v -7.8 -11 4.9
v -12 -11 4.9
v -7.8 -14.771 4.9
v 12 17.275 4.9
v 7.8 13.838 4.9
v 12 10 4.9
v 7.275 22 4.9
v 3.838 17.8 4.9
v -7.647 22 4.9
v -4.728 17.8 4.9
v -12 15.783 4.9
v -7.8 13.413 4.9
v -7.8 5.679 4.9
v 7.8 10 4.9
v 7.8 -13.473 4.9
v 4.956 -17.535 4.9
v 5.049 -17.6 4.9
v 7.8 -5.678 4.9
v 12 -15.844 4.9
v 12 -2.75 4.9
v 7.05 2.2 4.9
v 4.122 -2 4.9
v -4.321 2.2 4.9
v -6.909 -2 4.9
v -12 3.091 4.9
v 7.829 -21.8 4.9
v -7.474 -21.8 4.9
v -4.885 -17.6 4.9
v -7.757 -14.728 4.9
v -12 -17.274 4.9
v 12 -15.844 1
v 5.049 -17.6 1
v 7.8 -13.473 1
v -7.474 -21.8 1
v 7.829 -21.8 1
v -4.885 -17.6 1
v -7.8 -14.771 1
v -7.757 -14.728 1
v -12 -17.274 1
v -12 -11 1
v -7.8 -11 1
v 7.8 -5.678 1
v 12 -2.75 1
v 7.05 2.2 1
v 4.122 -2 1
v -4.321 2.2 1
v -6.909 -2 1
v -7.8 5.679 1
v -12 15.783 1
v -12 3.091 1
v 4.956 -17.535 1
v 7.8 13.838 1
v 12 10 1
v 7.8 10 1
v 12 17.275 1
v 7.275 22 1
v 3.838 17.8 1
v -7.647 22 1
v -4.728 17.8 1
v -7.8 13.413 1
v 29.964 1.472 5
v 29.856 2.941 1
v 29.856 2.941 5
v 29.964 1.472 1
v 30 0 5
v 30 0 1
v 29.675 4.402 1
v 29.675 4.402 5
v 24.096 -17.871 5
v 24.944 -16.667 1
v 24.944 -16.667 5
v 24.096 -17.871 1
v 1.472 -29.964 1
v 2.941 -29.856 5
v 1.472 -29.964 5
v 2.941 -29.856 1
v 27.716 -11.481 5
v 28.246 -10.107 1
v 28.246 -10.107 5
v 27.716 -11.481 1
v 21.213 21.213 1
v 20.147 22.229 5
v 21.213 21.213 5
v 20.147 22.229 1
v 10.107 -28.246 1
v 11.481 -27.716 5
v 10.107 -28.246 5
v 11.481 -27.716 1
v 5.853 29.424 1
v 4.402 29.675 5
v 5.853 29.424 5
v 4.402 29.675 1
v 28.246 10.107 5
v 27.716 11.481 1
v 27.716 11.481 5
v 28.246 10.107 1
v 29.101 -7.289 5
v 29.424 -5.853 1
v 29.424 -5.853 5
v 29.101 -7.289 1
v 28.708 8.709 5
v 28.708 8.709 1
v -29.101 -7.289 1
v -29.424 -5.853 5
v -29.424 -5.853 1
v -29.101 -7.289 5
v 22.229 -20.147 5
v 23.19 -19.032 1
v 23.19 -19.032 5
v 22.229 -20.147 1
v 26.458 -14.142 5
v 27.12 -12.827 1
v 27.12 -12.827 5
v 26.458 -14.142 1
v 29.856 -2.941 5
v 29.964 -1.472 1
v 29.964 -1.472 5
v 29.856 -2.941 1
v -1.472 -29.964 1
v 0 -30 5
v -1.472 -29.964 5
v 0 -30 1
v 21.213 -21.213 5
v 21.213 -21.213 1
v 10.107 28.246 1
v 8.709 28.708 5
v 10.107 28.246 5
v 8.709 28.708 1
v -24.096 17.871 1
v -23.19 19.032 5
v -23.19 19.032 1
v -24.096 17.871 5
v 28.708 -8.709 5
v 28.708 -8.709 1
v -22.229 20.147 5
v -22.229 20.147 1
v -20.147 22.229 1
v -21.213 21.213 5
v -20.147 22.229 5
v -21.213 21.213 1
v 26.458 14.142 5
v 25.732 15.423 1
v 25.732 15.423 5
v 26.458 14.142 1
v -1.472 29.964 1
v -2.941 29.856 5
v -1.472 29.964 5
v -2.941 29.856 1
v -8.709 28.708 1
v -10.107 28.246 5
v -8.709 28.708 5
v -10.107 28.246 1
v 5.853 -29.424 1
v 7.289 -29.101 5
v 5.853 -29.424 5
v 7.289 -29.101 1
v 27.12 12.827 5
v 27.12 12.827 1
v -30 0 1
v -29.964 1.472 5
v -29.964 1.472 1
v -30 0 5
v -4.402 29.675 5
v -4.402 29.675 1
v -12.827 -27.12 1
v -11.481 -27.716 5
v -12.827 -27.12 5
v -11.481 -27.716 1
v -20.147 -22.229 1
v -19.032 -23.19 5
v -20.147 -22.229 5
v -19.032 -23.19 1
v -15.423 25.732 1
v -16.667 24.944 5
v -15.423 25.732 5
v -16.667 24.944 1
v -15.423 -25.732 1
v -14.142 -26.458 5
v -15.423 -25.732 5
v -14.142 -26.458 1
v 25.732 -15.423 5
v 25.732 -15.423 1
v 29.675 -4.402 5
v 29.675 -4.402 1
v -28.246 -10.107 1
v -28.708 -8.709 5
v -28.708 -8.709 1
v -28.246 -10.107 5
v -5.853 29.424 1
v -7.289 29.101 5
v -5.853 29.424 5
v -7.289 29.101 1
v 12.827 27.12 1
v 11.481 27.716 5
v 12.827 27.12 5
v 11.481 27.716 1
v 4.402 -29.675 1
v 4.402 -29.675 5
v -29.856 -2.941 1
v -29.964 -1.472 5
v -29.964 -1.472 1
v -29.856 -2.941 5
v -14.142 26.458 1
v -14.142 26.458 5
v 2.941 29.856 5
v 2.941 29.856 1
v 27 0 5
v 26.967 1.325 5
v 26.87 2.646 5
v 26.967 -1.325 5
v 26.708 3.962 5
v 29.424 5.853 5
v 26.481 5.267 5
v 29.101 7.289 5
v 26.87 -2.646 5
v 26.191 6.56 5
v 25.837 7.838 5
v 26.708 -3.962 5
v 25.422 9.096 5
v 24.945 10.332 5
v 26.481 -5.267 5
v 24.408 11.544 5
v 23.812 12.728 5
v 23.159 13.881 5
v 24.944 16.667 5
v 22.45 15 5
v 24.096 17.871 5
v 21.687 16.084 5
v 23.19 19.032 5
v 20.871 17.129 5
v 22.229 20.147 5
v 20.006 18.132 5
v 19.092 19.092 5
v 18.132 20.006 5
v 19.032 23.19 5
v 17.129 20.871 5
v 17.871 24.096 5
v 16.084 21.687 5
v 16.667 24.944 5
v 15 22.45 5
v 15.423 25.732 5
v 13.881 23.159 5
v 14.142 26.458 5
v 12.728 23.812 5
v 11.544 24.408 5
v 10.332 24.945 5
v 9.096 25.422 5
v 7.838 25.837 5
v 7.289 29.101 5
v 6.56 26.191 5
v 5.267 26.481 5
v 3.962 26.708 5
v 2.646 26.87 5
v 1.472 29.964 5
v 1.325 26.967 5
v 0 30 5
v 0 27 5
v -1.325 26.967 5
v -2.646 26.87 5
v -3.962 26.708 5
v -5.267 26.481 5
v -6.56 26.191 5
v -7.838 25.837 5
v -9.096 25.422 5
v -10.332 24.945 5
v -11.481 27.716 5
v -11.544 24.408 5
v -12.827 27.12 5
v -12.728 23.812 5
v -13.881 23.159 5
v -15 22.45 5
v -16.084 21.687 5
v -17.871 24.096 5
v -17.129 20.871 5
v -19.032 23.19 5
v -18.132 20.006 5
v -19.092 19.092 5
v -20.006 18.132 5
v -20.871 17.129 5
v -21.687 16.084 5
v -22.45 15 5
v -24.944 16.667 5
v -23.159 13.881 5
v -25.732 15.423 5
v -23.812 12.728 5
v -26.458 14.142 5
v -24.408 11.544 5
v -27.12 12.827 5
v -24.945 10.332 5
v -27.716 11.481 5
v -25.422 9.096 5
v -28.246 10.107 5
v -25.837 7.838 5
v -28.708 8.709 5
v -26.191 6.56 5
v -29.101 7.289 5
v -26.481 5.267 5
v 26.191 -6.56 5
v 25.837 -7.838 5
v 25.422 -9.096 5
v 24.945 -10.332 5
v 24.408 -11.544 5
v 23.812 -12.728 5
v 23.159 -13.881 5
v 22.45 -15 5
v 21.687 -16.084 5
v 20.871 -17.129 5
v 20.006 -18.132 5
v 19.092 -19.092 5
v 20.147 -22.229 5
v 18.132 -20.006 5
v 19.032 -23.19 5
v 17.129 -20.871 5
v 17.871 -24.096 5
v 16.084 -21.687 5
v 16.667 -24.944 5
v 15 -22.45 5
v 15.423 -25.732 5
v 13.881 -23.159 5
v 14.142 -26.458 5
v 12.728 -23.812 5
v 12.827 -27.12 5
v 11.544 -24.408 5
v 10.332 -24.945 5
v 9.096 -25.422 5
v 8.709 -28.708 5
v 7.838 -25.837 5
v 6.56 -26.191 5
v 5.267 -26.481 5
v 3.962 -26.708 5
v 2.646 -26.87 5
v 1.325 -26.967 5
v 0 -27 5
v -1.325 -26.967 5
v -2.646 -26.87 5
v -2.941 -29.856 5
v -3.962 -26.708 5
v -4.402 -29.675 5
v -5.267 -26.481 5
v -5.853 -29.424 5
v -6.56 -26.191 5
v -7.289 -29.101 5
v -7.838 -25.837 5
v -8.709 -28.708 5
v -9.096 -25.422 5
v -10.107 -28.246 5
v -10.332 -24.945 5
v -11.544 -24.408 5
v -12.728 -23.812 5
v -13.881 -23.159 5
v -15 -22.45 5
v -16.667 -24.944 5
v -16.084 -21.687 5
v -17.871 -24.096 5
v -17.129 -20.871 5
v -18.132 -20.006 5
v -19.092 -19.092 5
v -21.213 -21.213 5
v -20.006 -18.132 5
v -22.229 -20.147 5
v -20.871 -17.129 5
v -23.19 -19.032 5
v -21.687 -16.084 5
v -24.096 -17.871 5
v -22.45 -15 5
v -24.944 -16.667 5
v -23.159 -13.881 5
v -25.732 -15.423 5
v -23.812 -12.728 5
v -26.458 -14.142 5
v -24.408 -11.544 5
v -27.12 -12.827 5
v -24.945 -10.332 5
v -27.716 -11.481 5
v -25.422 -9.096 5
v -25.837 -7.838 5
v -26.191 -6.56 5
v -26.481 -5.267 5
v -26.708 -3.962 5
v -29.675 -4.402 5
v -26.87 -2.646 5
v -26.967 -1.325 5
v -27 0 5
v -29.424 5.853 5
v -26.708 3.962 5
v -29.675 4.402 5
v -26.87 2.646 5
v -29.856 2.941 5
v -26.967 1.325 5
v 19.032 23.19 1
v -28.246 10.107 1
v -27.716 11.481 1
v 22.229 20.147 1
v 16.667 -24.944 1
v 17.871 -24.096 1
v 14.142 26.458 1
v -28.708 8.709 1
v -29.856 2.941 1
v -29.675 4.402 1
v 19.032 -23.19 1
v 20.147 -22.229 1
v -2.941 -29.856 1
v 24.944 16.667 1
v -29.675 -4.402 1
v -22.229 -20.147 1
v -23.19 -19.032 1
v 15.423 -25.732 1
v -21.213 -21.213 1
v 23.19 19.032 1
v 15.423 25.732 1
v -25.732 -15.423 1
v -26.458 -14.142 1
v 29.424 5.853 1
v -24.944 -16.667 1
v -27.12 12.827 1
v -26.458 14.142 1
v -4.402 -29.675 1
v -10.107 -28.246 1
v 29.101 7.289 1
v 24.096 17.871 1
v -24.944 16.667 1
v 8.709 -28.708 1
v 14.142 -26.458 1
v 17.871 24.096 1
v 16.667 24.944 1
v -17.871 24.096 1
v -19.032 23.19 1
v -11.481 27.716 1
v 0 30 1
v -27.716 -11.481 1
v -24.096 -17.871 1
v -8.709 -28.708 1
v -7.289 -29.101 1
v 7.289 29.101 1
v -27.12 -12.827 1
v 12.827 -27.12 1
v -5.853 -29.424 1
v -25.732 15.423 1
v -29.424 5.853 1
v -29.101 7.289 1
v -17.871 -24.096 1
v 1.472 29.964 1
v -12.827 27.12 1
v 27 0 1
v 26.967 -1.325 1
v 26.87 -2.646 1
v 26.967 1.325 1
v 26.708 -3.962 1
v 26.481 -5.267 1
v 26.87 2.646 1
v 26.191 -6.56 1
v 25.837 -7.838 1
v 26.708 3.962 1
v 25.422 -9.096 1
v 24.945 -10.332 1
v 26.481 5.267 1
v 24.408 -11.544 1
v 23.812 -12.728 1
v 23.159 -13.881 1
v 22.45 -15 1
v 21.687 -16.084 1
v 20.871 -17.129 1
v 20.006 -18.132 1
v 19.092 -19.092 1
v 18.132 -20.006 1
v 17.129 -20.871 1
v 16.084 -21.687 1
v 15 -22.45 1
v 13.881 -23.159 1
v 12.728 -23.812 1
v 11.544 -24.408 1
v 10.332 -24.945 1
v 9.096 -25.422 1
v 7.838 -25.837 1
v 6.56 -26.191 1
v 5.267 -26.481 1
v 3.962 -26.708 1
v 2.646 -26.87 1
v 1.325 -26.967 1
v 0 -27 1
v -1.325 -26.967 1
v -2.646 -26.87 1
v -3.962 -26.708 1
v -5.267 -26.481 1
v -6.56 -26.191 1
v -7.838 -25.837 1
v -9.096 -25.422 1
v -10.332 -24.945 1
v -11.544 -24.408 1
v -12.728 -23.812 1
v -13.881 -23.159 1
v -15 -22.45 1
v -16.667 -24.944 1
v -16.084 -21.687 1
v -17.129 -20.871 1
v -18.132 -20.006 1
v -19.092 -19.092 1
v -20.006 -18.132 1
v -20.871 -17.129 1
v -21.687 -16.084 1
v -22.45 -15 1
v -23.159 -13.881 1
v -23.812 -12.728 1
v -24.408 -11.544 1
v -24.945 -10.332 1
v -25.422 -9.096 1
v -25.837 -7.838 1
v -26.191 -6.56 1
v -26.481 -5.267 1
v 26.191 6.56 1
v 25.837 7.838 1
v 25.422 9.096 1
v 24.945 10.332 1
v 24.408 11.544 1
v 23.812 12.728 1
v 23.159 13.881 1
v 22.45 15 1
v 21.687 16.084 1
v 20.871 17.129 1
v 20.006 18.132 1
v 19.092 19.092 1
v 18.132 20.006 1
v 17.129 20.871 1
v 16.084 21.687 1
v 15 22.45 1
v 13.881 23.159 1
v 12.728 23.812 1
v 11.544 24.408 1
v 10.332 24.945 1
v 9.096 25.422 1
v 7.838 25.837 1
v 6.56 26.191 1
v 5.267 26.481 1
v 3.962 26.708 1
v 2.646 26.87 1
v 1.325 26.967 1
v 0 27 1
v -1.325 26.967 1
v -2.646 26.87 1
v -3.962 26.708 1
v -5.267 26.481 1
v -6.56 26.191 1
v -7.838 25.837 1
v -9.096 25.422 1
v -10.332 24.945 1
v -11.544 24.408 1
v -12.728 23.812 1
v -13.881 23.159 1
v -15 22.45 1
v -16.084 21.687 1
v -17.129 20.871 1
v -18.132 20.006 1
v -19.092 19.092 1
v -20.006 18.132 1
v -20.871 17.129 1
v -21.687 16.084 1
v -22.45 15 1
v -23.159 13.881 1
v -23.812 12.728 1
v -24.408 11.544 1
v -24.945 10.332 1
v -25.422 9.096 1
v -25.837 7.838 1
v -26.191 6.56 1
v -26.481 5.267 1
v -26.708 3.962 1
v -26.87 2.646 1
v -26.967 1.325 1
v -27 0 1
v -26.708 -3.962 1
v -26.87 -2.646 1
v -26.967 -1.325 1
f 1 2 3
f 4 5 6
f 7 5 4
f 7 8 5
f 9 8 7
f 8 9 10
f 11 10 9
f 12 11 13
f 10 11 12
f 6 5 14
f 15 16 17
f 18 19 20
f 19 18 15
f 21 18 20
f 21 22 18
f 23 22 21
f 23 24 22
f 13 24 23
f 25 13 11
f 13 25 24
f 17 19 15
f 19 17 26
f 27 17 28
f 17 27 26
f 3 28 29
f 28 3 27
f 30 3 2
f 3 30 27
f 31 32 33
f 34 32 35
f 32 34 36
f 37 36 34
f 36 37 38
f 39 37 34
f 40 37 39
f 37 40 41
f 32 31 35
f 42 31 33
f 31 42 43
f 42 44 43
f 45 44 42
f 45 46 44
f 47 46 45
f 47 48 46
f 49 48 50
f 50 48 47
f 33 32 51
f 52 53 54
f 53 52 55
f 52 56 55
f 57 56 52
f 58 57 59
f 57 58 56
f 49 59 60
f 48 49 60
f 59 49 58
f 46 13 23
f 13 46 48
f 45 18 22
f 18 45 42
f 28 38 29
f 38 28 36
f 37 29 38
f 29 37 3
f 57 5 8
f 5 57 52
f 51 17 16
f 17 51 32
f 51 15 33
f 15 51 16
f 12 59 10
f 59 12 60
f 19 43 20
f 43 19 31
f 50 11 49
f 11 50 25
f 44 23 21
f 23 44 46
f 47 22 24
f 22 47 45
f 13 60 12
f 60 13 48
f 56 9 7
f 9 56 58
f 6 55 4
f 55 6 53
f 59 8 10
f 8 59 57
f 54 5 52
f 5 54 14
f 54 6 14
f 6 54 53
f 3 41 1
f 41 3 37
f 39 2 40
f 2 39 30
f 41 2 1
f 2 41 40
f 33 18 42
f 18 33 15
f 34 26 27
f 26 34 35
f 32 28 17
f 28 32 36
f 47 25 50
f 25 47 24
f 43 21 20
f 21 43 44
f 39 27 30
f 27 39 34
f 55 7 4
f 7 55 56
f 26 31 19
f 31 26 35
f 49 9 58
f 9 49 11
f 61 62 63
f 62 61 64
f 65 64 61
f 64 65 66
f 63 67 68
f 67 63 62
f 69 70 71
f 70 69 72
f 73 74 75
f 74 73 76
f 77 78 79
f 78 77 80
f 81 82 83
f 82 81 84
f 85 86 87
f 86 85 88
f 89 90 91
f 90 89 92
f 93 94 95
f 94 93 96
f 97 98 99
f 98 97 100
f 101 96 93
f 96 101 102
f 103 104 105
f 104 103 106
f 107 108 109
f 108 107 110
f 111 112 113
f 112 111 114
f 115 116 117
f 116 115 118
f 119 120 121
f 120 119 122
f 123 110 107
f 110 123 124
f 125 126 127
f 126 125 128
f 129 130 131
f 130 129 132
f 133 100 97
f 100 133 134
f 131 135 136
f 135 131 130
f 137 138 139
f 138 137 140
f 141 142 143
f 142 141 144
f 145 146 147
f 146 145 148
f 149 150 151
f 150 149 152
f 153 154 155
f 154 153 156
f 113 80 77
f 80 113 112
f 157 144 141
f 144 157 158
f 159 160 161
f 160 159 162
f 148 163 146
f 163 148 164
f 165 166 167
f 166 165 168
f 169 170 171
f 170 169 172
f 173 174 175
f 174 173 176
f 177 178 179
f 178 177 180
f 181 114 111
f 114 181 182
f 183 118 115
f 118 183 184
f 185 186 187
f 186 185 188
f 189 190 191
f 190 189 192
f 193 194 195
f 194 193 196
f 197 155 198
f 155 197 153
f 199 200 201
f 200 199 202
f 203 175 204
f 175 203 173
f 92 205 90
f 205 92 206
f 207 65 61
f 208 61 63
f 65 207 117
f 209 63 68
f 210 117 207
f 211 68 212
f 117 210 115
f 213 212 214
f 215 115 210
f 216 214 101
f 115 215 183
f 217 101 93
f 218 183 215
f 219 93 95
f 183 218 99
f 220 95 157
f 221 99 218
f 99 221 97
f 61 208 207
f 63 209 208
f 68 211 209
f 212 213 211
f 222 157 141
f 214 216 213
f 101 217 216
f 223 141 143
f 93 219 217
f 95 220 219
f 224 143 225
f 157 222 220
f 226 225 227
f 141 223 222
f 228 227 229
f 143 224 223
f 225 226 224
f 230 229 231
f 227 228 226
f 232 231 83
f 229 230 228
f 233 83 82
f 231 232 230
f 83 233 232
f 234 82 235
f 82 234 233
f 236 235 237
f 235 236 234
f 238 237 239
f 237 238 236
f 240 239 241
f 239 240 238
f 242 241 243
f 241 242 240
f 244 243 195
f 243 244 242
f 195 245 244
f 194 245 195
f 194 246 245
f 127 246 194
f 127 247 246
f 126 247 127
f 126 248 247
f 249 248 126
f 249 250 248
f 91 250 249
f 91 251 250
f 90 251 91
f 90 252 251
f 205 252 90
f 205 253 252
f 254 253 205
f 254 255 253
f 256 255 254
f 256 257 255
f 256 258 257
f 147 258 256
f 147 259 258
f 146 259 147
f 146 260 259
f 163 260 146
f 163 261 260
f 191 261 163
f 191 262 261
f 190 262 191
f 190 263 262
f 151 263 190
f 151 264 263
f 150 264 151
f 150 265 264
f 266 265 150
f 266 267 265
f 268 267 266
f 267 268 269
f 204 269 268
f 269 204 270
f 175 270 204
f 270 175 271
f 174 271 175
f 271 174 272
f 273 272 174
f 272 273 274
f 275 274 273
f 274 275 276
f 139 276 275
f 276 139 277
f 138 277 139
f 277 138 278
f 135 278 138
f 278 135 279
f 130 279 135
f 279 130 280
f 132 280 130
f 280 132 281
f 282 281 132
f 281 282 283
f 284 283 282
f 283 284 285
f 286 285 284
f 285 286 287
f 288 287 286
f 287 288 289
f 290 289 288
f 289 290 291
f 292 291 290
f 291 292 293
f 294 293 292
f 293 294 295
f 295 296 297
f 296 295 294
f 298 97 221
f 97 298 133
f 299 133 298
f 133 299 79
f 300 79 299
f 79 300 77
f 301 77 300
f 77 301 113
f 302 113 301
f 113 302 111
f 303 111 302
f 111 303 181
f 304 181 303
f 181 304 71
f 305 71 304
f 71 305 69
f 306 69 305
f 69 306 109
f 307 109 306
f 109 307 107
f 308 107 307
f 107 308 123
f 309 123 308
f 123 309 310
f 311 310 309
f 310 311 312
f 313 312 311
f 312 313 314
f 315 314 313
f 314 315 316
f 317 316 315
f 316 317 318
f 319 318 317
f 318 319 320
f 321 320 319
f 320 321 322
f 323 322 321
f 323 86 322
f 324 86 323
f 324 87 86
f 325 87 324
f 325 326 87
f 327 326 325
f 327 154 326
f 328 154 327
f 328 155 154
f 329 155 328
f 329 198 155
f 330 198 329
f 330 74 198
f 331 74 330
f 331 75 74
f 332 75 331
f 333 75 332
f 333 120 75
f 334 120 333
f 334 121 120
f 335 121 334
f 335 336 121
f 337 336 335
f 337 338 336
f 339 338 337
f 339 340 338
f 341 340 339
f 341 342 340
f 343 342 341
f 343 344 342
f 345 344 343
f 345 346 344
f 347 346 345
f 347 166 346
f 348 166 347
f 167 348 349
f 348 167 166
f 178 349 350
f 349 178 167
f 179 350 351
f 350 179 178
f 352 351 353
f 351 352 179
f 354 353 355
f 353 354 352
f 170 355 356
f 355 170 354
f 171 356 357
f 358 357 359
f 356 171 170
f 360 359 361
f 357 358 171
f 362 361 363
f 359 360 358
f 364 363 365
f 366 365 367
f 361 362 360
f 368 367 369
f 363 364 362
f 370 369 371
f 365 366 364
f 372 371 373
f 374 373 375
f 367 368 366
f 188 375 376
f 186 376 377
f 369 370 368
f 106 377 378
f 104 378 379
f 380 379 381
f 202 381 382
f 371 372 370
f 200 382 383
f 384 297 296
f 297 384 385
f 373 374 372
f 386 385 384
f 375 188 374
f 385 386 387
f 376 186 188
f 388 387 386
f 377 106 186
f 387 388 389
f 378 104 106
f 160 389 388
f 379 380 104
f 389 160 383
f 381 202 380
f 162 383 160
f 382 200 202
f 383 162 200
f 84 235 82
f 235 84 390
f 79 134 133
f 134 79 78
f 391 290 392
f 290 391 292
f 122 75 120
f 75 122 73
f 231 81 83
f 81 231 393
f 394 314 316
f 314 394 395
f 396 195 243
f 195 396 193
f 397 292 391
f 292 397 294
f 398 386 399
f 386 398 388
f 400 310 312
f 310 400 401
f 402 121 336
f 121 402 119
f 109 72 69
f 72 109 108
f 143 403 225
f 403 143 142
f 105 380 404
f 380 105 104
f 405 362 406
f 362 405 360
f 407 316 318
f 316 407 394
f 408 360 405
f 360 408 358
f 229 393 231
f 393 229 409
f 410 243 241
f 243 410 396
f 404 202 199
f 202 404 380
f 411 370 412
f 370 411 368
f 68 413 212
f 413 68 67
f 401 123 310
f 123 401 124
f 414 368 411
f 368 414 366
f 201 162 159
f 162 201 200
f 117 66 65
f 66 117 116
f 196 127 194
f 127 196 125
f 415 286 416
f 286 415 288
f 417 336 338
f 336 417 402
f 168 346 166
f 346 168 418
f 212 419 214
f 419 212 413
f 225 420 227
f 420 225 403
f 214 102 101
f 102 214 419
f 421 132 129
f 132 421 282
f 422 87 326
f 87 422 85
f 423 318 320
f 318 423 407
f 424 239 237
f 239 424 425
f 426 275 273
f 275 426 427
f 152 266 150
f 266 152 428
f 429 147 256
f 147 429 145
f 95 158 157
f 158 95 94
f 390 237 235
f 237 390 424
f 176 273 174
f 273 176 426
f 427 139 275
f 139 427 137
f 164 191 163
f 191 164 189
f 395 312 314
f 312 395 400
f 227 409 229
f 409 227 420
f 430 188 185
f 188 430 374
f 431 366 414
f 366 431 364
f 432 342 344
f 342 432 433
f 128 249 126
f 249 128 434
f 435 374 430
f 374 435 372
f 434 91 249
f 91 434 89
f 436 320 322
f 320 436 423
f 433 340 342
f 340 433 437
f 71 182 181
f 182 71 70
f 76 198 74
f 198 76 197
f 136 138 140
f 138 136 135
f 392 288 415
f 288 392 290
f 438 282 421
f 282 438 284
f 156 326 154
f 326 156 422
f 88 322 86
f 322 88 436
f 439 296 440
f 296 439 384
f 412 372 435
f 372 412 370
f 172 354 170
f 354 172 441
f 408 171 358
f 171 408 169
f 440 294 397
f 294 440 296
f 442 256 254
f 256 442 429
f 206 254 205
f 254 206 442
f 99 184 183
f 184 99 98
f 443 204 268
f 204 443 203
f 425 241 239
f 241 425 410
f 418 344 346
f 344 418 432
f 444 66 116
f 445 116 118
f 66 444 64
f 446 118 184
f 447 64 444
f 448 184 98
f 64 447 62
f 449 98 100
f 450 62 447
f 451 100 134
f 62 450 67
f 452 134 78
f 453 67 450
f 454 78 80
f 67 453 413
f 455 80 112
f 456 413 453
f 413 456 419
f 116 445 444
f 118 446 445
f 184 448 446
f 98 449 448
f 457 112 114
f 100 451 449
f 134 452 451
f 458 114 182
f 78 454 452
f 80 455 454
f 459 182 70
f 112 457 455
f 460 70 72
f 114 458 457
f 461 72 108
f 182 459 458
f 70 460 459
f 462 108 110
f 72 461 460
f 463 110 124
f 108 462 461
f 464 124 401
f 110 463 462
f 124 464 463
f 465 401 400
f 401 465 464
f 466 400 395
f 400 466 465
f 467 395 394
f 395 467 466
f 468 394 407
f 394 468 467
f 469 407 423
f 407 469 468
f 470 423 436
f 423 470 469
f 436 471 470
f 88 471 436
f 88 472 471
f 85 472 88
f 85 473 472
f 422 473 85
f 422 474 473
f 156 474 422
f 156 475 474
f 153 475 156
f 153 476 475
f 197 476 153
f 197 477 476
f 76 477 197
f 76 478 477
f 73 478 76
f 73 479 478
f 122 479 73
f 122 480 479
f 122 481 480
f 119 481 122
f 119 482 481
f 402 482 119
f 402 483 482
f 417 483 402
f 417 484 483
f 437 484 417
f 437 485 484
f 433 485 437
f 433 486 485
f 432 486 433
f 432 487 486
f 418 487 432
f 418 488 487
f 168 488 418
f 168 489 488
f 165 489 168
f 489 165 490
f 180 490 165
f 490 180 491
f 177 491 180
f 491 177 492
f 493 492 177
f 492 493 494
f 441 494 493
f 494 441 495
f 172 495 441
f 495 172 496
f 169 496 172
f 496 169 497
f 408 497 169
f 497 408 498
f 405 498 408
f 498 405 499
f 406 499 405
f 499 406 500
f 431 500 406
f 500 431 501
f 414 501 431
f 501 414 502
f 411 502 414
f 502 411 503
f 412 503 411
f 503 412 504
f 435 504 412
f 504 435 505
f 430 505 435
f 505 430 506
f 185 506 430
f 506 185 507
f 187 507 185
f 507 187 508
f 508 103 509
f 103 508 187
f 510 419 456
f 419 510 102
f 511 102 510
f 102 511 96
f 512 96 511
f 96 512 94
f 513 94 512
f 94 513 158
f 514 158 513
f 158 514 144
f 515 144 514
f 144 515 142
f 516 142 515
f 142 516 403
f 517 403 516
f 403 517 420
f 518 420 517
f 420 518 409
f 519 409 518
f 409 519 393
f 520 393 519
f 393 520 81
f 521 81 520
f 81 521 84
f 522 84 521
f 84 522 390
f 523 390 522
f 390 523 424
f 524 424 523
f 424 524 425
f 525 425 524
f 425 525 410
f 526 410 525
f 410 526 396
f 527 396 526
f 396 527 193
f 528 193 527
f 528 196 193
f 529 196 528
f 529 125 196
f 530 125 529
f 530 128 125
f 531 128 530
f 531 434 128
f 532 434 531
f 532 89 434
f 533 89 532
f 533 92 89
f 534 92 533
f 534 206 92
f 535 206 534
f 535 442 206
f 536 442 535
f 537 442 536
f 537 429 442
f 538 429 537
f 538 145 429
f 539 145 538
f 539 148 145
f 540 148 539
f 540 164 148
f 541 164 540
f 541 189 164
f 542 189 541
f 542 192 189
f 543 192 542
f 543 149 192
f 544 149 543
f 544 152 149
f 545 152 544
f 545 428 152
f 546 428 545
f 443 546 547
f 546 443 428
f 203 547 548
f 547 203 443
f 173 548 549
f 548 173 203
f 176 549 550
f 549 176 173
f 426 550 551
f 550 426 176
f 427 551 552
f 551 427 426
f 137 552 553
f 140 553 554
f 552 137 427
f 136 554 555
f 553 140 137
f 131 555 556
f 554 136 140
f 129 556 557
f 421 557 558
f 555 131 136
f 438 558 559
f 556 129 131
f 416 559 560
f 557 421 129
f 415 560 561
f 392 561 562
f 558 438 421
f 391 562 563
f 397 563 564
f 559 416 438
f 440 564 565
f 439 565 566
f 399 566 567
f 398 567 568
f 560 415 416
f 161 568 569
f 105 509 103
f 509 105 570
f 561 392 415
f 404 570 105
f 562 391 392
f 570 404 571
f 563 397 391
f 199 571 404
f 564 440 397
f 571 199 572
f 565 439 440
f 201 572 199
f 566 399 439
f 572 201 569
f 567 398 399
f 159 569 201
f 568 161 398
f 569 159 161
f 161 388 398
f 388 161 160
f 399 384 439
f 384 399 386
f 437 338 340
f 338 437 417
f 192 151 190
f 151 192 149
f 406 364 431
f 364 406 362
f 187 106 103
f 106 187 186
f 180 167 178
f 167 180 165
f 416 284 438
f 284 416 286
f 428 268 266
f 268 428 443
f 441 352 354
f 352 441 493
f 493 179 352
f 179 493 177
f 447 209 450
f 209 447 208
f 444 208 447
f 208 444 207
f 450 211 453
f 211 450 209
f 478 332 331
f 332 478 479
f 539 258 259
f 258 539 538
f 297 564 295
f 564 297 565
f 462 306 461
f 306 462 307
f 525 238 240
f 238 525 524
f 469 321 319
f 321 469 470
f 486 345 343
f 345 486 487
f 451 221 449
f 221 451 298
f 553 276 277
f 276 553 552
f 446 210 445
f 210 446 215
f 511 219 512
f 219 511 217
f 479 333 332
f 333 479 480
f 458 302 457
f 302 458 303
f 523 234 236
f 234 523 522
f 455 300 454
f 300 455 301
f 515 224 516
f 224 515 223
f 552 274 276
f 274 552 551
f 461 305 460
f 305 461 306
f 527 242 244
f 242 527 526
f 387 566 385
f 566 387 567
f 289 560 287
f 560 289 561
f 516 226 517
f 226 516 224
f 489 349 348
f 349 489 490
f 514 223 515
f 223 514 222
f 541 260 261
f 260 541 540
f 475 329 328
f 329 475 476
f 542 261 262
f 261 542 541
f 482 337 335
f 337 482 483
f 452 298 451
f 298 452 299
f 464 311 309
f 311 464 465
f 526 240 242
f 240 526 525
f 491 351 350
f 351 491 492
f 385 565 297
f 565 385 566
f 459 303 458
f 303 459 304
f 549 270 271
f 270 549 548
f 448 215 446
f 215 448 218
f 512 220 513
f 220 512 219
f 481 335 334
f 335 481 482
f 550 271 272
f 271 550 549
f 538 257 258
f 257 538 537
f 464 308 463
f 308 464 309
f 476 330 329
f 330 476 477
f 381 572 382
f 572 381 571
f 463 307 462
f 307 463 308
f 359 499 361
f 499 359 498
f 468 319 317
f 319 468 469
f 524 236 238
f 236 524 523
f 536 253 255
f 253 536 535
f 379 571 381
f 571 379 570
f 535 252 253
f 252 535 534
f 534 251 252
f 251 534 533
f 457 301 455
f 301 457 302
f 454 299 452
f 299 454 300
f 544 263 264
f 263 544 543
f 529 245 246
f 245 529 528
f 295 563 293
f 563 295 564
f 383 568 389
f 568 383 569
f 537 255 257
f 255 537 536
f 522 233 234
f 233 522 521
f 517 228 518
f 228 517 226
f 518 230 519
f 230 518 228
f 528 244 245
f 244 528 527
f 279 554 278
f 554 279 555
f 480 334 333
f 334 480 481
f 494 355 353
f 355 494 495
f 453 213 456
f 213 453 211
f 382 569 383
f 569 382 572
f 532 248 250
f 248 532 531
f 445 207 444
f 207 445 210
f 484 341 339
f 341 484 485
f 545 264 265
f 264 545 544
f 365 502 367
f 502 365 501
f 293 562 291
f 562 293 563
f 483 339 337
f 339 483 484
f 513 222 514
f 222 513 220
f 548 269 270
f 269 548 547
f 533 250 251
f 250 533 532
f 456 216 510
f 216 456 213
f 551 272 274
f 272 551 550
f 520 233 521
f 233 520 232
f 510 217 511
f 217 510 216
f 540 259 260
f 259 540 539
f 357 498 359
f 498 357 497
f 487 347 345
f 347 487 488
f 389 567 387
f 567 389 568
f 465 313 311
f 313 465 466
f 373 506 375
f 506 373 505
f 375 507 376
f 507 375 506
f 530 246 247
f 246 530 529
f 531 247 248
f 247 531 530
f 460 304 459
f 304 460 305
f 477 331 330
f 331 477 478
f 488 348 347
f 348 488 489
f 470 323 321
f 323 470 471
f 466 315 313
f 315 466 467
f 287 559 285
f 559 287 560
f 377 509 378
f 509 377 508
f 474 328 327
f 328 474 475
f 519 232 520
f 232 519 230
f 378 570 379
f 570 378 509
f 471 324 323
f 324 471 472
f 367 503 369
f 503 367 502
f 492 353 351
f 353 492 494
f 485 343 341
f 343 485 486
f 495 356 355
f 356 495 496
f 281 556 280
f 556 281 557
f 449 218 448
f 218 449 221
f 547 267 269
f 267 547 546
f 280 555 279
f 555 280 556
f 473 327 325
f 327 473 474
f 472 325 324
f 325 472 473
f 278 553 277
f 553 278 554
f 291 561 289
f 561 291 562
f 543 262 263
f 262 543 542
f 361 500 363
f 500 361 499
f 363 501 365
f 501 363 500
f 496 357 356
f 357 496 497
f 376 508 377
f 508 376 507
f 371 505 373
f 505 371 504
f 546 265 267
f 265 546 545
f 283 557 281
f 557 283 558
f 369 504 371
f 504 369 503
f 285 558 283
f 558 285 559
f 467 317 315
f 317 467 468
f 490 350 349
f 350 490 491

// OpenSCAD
$fn=128;

translate([-12,-2,1]) scale([0.6,0.6,1.3]){

  difference(){
   union(){

	rotate([0,0,135]) translate([-5,-14,0]) cube([10,6,3]);
	rotate([0,0,135]) translate([-28,-25,0]) cube([10,6,3]);
	rotate([0,0,135]) translate([-30,10,0]) cube([10,6,3]);
	rotate([0,0,135]) translate([-5,-48,0]) cube([10,6,3]);
	rotate([0,0,235]) translate([-5,38,0]) cube([10,6,3]);
	rotate([0,0,235]) translate([-35,-15,0]) cube([10,6,3]);

	cube([40,7,3]);
	cube([7,40,3]);
	translate([0,33,0]) cube([40,7,3]);
	translate([33,20,0]) cube([7,15,3]);
	translate([0,-30,0]) cube([7,15,3]);
	translate([33,-33,0]) cube([7,40,3]);
	translate([0,-33,0]) cube([40,7,3]);

}   //union

	rotate([0,0,135]) translate([-8,-6,-1]) cube([15,6,5]);
	rotate([0,0,135]) translate([-30,-33.4,-1]) cube([15,6,5]);
	rotate([0,0,135]) translate([-30,18,-1]) cube([15,6,5]);
	rotate([0,0,135]) translate([-7,-57,-1]) cube([15,6,5]);
	rotate([0,0,235]) translate([-5,46,-1]) cube([15,6,5]);
	rotate([0,0,235]) translate([-37,-23,-1]) cube([15,6,5]);

}   //difference

}	//scale
 difference(){
	translate([0,0,1]) cylinder(4,30,30);
	translate([0,0,-1]) cylinder(8,27,27);
}
